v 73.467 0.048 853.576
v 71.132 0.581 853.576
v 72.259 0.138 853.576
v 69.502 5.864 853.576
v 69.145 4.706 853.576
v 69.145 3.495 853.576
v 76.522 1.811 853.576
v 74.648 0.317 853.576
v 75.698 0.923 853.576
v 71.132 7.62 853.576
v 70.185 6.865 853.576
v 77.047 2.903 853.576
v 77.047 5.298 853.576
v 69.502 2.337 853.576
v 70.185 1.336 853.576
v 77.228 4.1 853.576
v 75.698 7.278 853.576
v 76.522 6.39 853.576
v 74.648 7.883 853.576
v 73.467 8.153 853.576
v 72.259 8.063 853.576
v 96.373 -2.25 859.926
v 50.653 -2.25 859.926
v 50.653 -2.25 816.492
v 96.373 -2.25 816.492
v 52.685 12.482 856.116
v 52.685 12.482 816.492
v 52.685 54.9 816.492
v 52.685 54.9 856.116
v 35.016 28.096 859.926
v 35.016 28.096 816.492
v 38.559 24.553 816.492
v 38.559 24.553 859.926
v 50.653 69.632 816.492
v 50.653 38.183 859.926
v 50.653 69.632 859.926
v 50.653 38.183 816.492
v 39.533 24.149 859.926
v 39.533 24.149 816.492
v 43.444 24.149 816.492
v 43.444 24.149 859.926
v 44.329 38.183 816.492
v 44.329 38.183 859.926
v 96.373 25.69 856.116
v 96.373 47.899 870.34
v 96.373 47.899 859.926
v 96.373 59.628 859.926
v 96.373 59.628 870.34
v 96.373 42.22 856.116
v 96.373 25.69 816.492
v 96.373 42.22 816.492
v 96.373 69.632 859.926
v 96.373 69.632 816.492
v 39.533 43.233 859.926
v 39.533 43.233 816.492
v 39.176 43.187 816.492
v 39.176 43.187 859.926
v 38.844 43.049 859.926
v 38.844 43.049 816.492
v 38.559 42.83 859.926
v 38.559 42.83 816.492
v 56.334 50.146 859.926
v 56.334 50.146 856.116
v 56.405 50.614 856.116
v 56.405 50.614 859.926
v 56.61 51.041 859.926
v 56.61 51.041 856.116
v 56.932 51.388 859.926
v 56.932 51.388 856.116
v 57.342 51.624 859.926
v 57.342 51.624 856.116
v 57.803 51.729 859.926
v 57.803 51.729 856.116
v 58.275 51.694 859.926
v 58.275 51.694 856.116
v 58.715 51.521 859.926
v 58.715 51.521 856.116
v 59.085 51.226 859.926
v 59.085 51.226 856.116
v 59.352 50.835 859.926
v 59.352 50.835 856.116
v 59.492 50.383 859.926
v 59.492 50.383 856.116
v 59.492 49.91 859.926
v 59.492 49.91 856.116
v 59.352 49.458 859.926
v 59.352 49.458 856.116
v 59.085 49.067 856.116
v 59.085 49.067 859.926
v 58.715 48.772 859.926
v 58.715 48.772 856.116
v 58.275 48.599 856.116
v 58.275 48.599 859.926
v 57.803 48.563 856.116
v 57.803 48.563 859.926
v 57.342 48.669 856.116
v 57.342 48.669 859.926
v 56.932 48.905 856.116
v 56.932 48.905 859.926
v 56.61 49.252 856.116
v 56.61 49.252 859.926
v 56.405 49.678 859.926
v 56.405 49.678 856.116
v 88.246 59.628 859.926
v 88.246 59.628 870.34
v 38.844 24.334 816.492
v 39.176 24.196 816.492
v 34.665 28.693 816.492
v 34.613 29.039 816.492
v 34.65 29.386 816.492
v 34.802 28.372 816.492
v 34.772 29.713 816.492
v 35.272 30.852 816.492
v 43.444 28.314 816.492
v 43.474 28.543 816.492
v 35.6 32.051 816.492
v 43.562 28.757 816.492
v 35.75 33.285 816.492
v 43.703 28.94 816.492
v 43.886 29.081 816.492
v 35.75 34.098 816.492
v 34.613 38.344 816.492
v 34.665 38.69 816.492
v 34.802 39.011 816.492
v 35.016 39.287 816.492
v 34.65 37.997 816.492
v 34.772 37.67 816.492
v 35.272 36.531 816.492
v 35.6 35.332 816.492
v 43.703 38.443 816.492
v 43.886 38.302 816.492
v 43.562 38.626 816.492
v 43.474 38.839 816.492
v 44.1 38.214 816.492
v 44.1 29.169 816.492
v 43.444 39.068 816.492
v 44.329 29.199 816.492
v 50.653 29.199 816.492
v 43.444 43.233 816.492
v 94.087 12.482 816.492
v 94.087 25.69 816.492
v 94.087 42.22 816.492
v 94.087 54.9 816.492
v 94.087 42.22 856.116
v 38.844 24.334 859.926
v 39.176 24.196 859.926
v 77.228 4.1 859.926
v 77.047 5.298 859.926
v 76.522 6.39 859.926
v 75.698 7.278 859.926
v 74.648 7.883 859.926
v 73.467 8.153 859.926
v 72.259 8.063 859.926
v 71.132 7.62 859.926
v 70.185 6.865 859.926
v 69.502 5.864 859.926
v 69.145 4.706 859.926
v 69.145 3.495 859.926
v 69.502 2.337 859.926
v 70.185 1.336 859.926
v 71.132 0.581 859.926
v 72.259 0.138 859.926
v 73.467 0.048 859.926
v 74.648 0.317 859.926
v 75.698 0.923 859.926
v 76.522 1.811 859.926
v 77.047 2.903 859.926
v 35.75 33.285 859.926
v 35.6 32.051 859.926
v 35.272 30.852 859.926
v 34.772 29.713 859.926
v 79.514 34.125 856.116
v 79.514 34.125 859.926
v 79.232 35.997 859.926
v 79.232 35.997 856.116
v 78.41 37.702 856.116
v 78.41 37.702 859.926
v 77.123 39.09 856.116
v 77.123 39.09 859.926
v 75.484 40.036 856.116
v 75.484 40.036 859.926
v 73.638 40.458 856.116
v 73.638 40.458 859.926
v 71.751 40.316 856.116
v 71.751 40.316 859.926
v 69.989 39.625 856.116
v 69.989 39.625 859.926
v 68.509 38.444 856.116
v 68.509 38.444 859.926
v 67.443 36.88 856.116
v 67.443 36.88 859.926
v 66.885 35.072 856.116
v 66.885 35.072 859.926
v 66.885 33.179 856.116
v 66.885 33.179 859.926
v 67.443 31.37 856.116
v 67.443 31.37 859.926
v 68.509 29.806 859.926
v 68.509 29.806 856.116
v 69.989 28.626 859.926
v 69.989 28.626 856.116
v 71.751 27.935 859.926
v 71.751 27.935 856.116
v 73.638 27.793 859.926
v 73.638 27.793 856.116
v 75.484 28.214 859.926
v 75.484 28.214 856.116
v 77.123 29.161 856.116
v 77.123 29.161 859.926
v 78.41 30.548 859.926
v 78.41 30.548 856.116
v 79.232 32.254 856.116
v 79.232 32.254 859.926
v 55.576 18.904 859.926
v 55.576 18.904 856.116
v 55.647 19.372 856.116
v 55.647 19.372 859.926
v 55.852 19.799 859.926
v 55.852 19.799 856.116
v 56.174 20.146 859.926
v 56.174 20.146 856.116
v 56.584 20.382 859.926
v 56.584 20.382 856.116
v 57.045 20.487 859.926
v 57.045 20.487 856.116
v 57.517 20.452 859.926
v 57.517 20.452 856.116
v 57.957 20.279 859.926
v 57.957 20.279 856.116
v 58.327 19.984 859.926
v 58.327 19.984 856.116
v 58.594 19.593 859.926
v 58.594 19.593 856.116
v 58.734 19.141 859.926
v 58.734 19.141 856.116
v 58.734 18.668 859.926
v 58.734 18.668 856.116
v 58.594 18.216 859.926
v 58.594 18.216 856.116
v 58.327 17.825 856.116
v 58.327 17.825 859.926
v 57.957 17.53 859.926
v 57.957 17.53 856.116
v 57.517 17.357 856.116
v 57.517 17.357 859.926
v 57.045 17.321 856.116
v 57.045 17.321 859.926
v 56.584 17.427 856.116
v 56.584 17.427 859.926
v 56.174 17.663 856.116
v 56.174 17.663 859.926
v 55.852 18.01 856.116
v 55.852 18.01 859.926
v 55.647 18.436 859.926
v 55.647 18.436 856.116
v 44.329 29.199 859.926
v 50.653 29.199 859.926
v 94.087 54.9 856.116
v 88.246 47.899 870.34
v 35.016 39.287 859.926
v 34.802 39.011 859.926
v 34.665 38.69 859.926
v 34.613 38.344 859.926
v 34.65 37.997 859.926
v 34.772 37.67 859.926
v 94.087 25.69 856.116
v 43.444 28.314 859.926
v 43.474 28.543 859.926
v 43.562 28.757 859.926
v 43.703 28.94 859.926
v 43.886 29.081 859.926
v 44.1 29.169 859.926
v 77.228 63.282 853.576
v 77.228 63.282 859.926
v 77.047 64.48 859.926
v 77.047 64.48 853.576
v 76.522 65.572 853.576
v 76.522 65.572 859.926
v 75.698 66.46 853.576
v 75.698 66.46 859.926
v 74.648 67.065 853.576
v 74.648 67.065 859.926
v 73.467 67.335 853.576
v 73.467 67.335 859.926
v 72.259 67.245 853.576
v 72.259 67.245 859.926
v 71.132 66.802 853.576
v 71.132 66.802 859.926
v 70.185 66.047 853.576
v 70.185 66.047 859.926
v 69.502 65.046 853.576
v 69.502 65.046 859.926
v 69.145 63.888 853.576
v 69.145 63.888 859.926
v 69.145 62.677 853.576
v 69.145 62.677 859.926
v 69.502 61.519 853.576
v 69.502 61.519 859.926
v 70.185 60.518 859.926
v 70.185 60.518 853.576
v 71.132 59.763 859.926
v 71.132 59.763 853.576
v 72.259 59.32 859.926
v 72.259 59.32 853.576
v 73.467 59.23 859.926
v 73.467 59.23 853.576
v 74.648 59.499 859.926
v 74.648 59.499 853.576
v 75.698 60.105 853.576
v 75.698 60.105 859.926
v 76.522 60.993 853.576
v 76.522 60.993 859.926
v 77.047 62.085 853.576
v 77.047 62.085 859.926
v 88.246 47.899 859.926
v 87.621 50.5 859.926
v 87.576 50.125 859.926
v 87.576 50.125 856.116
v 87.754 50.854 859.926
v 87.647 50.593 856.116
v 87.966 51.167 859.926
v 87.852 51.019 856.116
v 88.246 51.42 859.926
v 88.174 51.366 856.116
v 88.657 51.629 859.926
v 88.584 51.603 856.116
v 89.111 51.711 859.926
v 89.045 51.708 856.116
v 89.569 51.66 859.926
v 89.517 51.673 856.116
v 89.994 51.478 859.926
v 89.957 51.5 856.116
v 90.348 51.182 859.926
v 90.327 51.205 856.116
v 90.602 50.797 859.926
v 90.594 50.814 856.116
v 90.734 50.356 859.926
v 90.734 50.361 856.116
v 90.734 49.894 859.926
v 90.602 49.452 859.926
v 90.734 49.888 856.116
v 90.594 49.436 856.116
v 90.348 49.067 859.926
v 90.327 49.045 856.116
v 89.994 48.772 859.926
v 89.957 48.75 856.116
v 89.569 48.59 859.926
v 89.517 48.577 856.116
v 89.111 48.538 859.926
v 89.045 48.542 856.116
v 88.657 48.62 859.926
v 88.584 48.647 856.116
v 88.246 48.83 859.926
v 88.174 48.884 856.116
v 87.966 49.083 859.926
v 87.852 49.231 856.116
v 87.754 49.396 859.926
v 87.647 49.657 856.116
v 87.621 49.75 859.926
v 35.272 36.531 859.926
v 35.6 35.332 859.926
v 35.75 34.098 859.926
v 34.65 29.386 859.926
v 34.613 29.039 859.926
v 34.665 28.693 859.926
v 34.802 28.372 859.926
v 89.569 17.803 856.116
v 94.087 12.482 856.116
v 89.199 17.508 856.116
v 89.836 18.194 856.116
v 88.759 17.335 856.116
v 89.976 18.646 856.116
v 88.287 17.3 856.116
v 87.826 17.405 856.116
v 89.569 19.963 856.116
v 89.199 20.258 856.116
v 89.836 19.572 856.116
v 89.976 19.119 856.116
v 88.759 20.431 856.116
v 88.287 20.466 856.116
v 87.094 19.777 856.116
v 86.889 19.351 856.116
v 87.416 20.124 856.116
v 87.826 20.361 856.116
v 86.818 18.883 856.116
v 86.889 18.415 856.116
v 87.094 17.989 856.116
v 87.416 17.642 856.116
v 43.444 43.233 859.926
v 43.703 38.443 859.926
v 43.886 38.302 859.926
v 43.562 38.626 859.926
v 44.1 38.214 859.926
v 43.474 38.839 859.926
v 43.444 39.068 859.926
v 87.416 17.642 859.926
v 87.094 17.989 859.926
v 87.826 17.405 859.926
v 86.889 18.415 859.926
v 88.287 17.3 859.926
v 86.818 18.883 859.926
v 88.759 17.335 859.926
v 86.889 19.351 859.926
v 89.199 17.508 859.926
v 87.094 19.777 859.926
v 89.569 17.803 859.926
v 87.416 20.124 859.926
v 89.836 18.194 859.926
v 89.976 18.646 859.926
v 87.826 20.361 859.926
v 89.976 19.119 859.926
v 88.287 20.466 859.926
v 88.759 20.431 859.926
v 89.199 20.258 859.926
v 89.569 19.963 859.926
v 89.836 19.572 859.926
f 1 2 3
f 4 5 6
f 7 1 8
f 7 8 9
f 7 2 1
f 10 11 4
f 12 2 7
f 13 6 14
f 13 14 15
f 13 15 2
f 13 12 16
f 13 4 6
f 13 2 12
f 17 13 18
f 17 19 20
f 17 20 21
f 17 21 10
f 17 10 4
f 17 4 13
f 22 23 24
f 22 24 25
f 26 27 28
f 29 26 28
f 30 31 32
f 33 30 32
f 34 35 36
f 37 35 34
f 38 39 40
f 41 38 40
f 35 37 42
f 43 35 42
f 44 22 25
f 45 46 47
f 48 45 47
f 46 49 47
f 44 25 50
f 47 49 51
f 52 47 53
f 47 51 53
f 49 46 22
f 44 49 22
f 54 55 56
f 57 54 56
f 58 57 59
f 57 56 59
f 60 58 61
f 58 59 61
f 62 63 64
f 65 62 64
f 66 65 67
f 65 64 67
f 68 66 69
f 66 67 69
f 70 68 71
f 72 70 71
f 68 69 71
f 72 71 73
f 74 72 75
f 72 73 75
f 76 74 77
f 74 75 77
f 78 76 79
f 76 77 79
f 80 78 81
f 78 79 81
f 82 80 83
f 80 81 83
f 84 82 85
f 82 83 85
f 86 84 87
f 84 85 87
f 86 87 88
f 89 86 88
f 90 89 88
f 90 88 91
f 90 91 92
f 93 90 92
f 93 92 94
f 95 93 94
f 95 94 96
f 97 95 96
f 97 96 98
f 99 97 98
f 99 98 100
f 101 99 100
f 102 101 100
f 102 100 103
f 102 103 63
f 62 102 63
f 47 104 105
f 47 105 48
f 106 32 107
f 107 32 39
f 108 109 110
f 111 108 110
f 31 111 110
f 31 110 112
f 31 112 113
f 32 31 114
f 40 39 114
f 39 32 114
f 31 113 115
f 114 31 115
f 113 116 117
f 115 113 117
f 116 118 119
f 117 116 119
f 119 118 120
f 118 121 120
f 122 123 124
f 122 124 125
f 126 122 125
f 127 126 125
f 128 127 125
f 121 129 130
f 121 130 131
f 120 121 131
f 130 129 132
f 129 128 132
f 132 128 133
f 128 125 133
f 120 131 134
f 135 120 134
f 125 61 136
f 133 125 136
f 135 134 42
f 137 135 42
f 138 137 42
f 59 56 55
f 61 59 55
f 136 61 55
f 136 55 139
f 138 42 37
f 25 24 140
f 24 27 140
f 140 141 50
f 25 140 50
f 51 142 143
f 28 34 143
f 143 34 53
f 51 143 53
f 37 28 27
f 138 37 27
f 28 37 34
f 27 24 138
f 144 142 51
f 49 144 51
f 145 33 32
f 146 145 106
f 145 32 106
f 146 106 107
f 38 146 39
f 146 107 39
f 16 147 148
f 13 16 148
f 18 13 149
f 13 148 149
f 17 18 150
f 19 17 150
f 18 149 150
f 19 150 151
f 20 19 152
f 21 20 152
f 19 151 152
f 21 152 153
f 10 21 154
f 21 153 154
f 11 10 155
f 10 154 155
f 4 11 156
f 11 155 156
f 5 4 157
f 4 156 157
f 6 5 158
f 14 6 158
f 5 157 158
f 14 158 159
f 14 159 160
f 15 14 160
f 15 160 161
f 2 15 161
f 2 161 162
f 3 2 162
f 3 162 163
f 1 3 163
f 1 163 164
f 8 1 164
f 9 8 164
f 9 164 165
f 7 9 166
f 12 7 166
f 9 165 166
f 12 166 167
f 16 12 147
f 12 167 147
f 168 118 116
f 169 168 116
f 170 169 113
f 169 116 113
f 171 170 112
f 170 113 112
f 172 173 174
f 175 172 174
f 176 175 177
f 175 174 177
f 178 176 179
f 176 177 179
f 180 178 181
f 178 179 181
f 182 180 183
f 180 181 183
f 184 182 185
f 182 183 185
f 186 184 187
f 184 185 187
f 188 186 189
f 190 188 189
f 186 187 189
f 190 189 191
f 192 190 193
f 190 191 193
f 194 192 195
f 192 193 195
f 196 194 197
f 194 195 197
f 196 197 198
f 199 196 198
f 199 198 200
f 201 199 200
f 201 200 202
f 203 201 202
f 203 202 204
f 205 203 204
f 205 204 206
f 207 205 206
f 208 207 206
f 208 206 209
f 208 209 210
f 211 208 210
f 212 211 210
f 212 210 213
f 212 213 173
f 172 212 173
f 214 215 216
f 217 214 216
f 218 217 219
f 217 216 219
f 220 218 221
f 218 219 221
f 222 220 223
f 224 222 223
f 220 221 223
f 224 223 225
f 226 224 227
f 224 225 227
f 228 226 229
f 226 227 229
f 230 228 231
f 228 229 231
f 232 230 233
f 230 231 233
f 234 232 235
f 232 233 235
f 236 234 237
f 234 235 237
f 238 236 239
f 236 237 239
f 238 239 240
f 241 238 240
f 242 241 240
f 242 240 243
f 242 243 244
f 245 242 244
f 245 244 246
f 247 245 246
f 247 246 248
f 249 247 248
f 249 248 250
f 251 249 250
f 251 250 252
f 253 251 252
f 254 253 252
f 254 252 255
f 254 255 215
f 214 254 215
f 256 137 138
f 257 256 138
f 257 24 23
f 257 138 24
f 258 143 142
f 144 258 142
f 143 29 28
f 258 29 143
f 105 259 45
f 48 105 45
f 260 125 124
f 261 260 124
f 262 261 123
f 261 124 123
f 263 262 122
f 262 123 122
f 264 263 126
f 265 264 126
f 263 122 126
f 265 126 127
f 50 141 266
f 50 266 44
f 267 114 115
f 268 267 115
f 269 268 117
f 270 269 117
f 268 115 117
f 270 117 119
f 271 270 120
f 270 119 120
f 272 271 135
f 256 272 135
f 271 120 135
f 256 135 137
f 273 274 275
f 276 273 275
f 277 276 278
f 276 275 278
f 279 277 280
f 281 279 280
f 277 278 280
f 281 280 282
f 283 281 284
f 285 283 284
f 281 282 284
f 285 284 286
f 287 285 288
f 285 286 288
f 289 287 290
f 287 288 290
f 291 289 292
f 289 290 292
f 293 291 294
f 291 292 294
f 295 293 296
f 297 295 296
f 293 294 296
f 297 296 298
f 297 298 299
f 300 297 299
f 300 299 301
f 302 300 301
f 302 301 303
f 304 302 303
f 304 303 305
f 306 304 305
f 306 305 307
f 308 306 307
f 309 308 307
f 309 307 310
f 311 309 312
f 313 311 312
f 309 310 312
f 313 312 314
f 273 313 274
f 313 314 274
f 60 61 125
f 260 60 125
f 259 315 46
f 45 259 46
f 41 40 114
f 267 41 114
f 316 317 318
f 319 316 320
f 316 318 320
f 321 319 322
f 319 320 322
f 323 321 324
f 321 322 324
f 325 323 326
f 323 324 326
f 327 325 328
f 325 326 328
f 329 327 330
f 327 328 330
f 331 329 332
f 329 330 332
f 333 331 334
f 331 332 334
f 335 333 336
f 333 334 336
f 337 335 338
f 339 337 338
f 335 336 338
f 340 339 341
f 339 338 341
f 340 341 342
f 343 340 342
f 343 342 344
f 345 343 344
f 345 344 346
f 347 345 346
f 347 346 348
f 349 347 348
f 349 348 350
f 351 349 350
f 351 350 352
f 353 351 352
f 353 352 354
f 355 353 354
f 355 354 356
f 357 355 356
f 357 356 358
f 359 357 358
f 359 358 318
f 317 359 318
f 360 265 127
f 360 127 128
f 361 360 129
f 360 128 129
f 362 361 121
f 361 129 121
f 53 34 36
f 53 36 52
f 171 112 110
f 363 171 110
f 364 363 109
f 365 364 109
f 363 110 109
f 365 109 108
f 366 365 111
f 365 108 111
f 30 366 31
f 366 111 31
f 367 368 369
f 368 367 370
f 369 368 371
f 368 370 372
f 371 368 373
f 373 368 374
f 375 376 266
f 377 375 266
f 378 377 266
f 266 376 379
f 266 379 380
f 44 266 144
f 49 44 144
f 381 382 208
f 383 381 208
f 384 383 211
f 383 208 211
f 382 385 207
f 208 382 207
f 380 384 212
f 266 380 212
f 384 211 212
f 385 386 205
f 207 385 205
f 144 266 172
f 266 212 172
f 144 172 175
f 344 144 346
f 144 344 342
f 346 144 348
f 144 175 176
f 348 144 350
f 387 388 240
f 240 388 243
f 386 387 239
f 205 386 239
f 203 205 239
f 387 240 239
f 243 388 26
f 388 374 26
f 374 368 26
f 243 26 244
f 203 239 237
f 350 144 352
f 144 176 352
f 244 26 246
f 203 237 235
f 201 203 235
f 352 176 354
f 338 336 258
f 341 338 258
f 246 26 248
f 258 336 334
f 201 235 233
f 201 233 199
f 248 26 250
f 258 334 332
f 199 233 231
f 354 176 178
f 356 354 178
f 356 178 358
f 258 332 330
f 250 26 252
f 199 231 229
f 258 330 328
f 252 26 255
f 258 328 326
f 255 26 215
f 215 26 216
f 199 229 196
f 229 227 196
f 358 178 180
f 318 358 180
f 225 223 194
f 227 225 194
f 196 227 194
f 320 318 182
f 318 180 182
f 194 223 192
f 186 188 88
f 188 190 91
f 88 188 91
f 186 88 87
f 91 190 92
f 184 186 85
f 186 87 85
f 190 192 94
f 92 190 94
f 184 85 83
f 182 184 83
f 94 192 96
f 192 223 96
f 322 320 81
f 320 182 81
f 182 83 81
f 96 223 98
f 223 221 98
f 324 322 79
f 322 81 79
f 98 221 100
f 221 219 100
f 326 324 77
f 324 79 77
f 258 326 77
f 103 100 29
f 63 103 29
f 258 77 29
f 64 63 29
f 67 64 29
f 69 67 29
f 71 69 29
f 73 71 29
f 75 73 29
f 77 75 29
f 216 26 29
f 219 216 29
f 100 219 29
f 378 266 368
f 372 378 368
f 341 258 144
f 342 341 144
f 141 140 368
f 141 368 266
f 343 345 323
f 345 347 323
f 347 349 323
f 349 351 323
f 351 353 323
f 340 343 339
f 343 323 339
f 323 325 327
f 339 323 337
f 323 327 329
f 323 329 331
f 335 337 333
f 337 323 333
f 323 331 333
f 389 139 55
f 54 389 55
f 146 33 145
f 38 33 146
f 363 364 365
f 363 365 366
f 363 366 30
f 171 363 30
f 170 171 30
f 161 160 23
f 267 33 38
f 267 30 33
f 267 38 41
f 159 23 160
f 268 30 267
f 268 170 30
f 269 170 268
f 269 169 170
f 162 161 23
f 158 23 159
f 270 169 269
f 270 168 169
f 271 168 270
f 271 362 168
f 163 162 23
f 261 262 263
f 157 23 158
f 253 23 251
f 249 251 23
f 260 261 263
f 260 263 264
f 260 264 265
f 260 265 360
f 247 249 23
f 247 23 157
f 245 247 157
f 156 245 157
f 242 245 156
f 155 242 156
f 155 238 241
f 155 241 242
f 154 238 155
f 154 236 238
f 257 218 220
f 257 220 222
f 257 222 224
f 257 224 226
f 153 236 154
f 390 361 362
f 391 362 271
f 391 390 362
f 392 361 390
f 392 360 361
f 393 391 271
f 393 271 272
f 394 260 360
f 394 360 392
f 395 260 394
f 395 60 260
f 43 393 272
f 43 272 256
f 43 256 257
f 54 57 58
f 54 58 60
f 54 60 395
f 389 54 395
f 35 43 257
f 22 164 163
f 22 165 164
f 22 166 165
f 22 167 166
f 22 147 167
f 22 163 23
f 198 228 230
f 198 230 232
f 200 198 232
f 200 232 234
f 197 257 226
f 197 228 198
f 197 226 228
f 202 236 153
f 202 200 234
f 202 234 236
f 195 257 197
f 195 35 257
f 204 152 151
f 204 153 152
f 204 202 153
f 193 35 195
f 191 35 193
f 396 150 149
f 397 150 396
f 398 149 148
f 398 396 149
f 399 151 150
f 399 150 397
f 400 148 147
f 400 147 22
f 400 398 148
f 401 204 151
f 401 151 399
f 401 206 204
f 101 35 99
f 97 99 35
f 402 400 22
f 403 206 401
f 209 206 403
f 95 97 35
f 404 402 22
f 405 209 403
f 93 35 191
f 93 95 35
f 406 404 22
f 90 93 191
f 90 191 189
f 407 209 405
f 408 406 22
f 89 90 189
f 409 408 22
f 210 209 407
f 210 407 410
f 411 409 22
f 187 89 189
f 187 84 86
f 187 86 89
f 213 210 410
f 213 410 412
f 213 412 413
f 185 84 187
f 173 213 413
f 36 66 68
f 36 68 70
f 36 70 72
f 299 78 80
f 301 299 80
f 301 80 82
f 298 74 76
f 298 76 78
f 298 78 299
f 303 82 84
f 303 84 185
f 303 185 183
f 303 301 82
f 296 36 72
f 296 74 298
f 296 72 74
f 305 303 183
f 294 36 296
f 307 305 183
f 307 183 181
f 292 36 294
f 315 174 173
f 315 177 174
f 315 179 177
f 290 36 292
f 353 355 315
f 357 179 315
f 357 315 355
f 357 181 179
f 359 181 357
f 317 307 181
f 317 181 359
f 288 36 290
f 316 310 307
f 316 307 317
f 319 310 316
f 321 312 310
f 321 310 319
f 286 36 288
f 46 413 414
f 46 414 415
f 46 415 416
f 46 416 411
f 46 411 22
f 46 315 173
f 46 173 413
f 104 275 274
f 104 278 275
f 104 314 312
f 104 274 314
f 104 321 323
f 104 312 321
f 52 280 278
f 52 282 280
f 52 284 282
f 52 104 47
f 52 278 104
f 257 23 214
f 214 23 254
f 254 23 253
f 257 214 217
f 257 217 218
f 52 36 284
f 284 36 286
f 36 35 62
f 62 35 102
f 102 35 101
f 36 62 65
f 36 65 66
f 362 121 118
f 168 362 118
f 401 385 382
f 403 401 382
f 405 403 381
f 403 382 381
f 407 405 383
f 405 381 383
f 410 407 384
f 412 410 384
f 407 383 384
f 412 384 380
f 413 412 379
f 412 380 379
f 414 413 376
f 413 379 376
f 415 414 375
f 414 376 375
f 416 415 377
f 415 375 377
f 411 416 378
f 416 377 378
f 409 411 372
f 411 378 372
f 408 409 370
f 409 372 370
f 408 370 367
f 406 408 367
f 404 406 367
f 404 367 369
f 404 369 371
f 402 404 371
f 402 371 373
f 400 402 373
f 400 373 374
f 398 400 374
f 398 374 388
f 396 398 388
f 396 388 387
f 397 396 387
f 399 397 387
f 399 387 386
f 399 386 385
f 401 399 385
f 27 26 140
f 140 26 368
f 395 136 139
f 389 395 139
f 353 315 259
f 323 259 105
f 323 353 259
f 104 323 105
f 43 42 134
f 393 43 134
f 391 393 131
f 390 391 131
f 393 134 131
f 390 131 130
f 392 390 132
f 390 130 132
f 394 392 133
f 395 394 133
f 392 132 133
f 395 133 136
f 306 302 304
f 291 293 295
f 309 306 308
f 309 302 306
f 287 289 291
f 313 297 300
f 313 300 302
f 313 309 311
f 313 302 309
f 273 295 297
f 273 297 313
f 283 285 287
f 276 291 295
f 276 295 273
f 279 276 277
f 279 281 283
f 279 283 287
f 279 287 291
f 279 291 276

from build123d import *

# Parameters (mm, degrees)
BOSS_EXTRUDE1_DEPTH = 43.434
SKETCH3_W           = 3.81
SKETCH3_H           = 46.482
BOSS_EXTRUDE2_DEPTH = 43.688
BOSS_EXTRUDE5_DEPTH = 39.624
SKETCH9_R           = 6.35
CUT_EXTRUDE1_DEPTH  = 44.434
SKETCH10_R          = 1.5875
CUT_EXTRUDE2_DEPTH  = 4.81
SKETCH12_W          = 45.72
SKETCH12_H          = 43.434
BOSS_EXTRUDE6_DEPTH = 12.7
SKETCH13_W          = 45.72
SKETCH13_H          = 43.434
BOSS_EXTRUDE7_DEPTH = 12.7
SKETCH14_R          = 4.064
CUT_EXTRUDE3_DEPTH  = 6.35
SKETCH15_W          = 8.127430184
SKETCH15_H          = 11.729450278
BOSS_EXTRUDE8_DEPTH = 10.414


with BuildPart() as part:
    # Sketch2 → Boss-Extrude1 (new body)
    with BuildSketch(Plane.XY.offset(816.492372385)):
        with BuildLine():
            Line((35.750095932, 34.097582937), (35.750095932, 33.285263123))
            ThreePointArc((35.750095932, 33.285263123), (35.457981836, 31.445408446), (34.772439624, 29.71323416))
            ThreePointArc((34.772439624, 29.71323416), (34.62798184, 28.864383796), (35.01595222, 28.095687512))
            Line((35.01595222, 28.095687512), (38.55890274, 24.552736992))
            ThreePointArc((38.55890274, 24.552736992), (39.005633691, 24.254240914), (39.532588778, 24.14942303))
            Line((39.532588778, 24.14942303), (43.443796213, 24.14942303))
            Line((43.443796213, 24.14942303), (43.443796213, 28.31442303))
            ThreePointArc((43.443796213, 28.31442303), (43.703006711, 28.940212531), (44.328796213, 29.19942303))
            Line((44.328796213, 29.19942303), (48.113296213, 29.19942303))
            Line((48.113296213, 29.19942303), (50.653296213, 29.19942303))
            Line((50.653296213, 29.19942303), (50.653296213, 10.45042303))
            Line((50.653296213, 10.45042303), (52.685296213, 10.45042303))
            Line((52.685296213, 10.45042303), (52.685296213, 56.93242303))
            Line((52.685296213, 56.93242303), (50.653296213, 56.93242303))
            Line((50.653296213, 56.93242303), (50.653296213, 38.18342303))
            Line((50.653296213, 38.18342303), (48.113296213, 38.18342303))
            Line((48.113296213, 38.18342303), (44.328796213, 38.18342303))
            ThreePointArc((44.328796213, 38.18342303), (43.703006711, 38.442633529), (43.443796213, 39.06842303))
            Line((43.443796213, 39.06842303), (43.443796213, 43.23342303))
            Line((43.443796213, 43.23342303), (39.532588778, 43.23342303))
            ThreePointArc((39.532588778, 43.23342303), (39.005633691, 43.128605146), (38.55890274, 42.830109068))
            Line((38.55890274, 42.830109068), (35.01595222, 39.287158548))
            ThreePointArc((35.01595222, 39.287158548), (34.62798184, 38.518462264), (34.772439624, 37.6696119))
            ThreePointArc((34.772439624, 37.6696119), (35.457981836, 35.937437615), (35.750095932, 34.097582937))
        make_face()
    extrude(amount=BOSS_EXTRUDE1_DEPTH)

    # Sketch3 → Boss-Extrude2 (add)
    with BuildSketch(Plane(origin=(52.685296213, 0, 0), x_dir=(0, 0, -1), z_dir=(1, 0, 0))):
        with Locations((-858.021372385, 33.69142303)):
            Rectangle(SKETCH3_W, SKETCH3_H)
    extrude(amount=BOSS_EXTRUDE2_DEPTH)

    # Sketch8 → Boss-Extrude5 (add)
    with BuildSketch(Plane(origin=(0, 0, 856.116372385), x_dir=(-1, 0, 0), z_dir=(0, 0, -1))):
        Polygon((-96.373296213, 56.93242303), (-52.685296213, 56.93242303), (-52.685296213, 54.90042303), (-94.087296213, 54.90042303), (-94.087296213, 42.220354744), (-96.373296213, 42.220354744), (-96.373296213, 54.90042303), align=None)
        Polygon((-96.373296213, 10.45042303), (-52.685296213, 10.45042303), (-52.685296213, 12.48242303), (-94.087296213, 12.48242303), (-94.087296213, 25.69042303), (-96.373296213, 25.69042303), (-96.373296213, 12.48242303), align=None)
    extrude(amount=BOSS_EXTRUDE5_DEPTH)

    # Sketch9 → Cut-Extrude1 (cut, through all)
    with BuildSketch(Plane.XY.offset(859.926372385)):
        with Locations((73.163747061, 34.125316724)):
            Circle(SKETCH9_R)
    extrude(amount=-CUT_EXTRUDE1_DEPTH, mode=Mode.SUBTRACT)

    # Sketch10 → Cut-Extrude2 (cut, through all)
    with BuildSketch(Plane(origin=(0, 0, 856.116372385), x_dir=(-1, 0, 0), z_dir=(0, 0, -1))):
        with Locations((-89.163747266, 50.124873673)):
            Circle(SKETCH10_R)
        with Locations((-57.921747266, 50.14642303)):
            Circle(SKETCH10_R)
        with Locations((-57.163746856, 18.90442303)):
            Circle(SKETCH10_R)
        with Locations((-88.405746856, 18.882873673)):
            Circle(SKETCH10_R)
    extrude(amount=-CUT_EXTRUDE2_DEPTH, mode=Mode.SUBTRACT)

    # Sketch12 → Boss-Extrude6 (add)
    with BuildSketch(Plane(origin=(0, 56.93242303, 0), x_dir=(1, 0, 0), z_dir=(0, 1, 0))):
        with Locations((73.513296213, -838.209372385)):
            Rectangle(SKETCH12_W, SKETCH12_H)
    extrude(amount=BOSS_EXTRUDE6_DEPTH)

    # Sketch13 → Boss-Extrude7 (add)
    with BuildSketch(Plane.XZ.offset(-10.45042303)):
        with Locations((73.513296213, 838.209372385)):
            Rectangle(SKETCH13_W, SKETCH13_H)
    extrude(amount=BOSS_EXTRUDE7_DEPTH)

    # Sketch14 → Cut-Extrude3 (cut)
    with BuildSketch(Plane.XY.offset(859.926372385)):
        with Locations((73.163747061, 63.28242303)):
            Circle(SKETCH14_R)
        with Locations((73.163747061, 4.10042303)):
            Circle(SKETCH14_R)
    extrude(amount=-CUT_EXTRUDE3_DEPTH, mode=Mode.SUBTRACT)

    # Sketch15 → Boss-Extrude8 (add)
    with BuildSketch(Plane.XY.offset(859.926372385)):
        with Locations((92.309581121, 53.763579533)):
            Rectangle(SKETCH15_W, SKETCH15_H)
    extrude(amount=BOSS_EXTRUDE8_DEPTH)


solid = part.part
